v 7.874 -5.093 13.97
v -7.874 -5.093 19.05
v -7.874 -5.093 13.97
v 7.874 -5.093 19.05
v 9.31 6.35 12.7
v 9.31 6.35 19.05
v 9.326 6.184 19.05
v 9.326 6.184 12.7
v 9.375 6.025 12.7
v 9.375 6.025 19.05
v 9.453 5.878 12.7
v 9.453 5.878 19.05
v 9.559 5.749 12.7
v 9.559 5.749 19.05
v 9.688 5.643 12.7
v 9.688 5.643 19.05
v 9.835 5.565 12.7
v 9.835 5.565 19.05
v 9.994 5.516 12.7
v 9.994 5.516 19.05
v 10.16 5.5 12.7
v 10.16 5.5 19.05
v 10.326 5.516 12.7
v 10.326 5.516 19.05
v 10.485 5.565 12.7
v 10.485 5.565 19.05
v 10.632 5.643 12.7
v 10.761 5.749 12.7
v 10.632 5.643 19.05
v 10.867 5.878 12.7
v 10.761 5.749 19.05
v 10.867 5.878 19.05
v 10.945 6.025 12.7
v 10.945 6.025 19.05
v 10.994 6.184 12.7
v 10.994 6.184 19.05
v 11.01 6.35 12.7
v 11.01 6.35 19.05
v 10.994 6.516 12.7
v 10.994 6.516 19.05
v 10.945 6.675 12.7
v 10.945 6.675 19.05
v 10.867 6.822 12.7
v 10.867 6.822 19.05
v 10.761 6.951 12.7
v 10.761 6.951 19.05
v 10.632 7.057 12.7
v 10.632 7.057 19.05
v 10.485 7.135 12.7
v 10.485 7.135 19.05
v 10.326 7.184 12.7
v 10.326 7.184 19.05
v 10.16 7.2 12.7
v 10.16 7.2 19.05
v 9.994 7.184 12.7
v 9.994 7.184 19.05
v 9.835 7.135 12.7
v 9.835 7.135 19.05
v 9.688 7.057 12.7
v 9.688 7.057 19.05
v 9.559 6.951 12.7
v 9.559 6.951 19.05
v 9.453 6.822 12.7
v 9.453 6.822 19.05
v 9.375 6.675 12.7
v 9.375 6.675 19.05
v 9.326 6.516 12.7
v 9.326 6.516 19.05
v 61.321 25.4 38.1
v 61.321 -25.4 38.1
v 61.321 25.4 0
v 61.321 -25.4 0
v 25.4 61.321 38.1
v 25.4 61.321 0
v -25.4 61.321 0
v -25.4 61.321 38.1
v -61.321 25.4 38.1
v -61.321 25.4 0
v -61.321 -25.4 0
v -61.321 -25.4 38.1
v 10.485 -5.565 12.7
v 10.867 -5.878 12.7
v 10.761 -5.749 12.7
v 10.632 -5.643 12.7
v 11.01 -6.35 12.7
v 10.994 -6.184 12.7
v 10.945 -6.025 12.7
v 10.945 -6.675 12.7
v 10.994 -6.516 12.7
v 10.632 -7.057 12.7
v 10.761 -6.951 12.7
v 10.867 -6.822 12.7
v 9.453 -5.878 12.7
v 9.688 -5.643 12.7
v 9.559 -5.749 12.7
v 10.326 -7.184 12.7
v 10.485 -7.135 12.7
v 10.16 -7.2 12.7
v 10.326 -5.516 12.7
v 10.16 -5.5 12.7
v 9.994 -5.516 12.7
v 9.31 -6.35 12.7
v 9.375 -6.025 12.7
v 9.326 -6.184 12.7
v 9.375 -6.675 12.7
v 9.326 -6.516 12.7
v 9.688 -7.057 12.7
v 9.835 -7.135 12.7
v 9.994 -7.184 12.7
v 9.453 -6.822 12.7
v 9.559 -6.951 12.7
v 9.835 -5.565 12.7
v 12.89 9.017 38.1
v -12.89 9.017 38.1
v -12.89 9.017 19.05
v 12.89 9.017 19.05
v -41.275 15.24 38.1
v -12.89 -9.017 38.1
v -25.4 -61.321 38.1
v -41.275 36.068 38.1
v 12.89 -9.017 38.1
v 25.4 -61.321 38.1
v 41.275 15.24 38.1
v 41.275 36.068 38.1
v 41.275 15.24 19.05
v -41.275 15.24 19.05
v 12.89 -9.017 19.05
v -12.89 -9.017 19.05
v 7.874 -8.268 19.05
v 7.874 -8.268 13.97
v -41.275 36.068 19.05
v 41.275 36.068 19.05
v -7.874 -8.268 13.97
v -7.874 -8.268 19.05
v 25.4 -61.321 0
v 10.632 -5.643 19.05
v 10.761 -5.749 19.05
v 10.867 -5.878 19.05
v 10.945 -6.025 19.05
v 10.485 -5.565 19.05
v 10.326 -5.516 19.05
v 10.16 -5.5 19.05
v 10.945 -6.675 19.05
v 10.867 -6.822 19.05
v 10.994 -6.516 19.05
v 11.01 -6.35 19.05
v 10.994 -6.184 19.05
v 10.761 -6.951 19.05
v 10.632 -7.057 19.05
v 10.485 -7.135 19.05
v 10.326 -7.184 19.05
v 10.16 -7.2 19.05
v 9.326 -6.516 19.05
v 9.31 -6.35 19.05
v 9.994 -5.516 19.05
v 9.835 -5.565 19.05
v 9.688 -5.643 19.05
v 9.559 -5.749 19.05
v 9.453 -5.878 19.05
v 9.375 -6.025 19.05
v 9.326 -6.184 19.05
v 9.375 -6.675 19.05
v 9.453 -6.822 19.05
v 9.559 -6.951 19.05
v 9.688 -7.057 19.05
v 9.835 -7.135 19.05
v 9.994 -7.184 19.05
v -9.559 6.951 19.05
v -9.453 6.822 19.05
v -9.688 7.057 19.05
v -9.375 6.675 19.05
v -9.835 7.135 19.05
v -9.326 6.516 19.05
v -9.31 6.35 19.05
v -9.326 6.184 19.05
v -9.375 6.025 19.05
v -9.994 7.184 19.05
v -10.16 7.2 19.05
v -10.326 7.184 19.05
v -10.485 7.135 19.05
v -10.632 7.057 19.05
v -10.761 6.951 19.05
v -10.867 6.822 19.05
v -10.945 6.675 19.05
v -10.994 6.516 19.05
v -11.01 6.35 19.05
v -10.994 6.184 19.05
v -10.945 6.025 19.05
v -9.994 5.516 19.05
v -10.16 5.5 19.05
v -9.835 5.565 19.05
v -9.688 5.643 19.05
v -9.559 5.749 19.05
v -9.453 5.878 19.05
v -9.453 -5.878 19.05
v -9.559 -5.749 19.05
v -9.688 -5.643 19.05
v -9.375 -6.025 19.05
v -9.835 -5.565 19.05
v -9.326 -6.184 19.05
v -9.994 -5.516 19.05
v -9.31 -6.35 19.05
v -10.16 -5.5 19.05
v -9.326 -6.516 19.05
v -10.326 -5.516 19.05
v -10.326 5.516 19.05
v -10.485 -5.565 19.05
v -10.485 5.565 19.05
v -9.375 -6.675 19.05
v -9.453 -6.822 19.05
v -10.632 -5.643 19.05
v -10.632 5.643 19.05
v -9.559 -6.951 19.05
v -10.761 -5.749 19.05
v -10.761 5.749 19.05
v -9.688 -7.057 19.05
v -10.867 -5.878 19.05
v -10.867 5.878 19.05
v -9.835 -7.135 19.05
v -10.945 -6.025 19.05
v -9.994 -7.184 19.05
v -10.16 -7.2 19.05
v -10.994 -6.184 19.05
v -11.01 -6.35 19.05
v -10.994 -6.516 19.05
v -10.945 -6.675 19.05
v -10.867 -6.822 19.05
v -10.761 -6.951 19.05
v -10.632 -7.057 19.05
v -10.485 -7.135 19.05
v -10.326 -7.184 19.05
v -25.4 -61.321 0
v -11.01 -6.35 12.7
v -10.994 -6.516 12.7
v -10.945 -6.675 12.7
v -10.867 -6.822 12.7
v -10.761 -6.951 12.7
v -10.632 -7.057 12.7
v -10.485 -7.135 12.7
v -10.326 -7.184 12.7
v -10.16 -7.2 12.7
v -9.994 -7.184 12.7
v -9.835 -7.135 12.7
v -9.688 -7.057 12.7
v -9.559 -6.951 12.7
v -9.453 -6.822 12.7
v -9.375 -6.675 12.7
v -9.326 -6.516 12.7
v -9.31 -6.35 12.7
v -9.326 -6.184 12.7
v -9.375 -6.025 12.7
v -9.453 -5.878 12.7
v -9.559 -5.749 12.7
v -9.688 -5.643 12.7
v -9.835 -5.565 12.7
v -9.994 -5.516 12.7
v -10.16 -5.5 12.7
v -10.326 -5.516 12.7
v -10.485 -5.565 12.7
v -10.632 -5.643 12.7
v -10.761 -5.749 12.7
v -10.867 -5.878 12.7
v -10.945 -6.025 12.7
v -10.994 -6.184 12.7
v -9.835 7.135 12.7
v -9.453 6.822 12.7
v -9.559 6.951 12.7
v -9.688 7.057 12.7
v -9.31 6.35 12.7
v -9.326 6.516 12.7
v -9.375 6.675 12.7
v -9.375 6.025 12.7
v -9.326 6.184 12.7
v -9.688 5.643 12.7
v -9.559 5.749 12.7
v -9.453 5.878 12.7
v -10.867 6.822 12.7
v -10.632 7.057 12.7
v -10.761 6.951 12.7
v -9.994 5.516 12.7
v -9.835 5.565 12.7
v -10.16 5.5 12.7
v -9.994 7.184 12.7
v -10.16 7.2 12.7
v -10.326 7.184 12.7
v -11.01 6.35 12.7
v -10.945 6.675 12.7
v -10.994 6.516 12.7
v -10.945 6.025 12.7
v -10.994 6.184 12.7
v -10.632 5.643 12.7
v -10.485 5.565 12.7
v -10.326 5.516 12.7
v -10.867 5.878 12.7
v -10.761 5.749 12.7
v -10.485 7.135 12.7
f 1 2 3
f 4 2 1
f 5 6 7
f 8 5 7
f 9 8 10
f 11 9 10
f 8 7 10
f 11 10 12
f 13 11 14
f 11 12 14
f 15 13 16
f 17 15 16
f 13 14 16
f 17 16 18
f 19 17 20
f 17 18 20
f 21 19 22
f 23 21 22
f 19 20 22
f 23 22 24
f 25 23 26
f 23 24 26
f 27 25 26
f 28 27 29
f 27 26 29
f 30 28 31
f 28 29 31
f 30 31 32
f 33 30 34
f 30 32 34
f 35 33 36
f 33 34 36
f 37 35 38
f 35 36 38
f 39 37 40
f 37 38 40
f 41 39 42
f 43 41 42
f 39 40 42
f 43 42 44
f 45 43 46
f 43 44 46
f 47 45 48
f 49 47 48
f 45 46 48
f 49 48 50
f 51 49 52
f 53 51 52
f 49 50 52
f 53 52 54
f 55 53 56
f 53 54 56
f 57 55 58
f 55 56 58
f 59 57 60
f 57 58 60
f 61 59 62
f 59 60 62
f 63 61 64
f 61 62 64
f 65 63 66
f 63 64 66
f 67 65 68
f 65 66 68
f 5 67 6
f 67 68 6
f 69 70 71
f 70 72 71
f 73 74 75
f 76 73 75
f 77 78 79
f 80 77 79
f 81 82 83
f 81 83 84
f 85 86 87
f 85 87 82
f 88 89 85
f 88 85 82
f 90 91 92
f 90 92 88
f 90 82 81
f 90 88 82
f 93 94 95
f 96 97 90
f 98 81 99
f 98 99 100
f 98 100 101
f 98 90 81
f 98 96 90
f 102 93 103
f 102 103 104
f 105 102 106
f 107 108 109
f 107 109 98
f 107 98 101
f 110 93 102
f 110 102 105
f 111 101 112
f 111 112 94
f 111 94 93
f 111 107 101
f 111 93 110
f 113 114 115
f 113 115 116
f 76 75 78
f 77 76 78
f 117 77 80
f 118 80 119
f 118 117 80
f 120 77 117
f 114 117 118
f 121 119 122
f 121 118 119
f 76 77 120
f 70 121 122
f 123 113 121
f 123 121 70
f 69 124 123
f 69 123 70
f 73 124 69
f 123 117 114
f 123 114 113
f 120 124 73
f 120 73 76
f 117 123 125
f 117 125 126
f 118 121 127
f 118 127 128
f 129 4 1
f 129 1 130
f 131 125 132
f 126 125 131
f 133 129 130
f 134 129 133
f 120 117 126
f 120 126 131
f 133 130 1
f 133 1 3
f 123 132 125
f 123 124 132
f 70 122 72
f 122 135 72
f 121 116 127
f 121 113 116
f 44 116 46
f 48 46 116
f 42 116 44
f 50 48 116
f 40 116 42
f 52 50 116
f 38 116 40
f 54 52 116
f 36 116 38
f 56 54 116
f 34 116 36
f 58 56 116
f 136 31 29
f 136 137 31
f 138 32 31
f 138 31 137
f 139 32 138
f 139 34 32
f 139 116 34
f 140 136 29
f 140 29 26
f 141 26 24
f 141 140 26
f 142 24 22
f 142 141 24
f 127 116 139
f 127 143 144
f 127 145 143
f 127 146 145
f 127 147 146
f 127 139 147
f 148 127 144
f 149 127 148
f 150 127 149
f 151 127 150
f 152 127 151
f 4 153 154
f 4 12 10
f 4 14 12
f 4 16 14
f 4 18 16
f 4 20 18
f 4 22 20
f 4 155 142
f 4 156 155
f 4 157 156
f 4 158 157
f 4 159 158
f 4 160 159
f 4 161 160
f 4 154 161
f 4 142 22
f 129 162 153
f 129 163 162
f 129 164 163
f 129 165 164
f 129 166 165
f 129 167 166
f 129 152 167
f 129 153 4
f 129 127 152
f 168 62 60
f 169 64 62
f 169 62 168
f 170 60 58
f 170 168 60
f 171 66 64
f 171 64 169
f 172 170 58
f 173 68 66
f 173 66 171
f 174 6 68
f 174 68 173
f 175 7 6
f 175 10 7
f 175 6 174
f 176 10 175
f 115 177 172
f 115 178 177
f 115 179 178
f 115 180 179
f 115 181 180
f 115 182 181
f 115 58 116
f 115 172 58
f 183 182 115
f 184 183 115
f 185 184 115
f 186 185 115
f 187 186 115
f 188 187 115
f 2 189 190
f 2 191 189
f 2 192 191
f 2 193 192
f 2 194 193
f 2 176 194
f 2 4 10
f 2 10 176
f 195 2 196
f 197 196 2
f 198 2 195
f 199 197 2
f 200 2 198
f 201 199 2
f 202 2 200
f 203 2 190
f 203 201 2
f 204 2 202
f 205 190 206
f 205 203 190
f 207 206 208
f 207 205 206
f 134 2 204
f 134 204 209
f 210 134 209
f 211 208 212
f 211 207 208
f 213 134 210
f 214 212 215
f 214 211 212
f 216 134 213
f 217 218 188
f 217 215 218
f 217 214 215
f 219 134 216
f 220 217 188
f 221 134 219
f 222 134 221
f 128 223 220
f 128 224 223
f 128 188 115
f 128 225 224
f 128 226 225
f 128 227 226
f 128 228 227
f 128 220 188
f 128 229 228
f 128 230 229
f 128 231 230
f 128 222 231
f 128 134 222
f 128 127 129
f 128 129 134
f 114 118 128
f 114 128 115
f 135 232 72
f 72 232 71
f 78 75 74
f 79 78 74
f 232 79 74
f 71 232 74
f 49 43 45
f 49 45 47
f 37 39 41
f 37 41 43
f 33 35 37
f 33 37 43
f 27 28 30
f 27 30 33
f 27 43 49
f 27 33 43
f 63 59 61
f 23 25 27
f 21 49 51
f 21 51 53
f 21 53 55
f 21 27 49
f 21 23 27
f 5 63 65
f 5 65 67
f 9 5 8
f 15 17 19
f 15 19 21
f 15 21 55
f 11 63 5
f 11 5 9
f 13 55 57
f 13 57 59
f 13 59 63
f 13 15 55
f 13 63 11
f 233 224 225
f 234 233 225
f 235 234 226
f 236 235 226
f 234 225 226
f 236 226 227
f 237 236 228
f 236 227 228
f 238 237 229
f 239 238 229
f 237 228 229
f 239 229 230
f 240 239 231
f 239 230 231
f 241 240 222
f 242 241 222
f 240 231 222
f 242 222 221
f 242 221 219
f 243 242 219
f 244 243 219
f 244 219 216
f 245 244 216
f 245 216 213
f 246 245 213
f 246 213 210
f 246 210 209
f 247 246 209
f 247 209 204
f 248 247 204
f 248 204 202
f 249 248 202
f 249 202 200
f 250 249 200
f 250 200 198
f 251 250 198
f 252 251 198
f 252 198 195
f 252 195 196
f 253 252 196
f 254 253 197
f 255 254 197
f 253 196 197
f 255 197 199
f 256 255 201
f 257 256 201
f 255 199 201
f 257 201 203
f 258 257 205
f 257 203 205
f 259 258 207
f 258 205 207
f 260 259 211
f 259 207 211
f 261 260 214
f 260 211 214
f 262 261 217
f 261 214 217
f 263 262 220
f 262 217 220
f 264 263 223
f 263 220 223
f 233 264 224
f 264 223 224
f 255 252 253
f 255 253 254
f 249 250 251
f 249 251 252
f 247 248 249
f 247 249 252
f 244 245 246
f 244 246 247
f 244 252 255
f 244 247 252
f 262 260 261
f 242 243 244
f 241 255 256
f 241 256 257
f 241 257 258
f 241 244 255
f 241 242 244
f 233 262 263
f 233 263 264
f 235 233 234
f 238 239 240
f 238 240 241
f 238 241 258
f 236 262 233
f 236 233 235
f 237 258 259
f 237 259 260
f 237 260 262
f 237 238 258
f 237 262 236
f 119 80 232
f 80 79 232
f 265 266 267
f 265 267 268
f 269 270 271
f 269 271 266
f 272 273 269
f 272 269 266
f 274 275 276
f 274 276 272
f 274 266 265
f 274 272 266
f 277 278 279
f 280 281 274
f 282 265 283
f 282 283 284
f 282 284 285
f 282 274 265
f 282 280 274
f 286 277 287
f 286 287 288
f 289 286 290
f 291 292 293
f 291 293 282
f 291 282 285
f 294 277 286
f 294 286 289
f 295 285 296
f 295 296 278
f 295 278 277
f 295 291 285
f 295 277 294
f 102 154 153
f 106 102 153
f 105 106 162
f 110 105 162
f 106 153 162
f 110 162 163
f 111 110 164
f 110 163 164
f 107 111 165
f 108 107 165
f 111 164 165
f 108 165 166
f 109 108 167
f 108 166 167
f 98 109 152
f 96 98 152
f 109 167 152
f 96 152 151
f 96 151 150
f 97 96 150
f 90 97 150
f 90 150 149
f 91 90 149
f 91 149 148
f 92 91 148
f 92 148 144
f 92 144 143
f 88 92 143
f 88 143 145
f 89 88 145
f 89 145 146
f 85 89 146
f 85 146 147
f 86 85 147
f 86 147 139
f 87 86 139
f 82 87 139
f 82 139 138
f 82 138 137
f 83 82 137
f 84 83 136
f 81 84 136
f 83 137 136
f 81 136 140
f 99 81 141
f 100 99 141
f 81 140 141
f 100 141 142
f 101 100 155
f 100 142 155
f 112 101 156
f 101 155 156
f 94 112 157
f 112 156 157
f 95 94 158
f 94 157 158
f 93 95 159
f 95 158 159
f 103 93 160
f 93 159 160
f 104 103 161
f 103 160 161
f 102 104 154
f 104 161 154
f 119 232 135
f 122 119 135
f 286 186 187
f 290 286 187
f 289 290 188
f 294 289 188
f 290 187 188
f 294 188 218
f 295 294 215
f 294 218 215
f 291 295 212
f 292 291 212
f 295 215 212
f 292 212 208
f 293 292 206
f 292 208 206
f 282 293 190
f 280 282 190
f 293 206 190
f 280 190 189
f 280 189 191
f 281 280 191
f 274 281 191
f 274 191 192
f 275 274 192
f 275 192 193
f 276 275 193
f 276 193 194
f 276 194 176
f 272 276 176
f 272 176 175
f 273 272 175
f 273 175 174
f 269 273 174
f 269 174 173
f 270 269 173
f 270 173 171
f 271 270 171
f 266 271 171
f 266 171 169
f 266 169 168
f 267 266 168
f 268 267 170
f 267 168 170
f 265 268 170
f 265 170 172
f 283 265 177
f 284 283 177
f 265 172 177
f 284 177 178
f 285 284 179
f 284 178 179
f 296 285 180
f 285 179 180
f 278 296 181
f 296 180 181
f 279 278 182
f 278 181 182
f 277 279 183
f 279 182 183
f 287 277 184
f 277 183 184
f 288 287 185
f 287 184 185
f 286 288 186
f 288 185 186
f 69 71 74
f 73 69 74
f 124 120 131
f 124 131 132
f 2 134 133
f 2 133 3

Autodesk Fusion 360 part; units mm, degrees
sketch "Sketch1" plane through (0, 0, 0) normal (0, 0, 1) x (1, 0, 0)
  line L0 (61.321, 25.4) -> (25.4, 61.321)
  line L1 (25.4, 61.321) -> (-25.4, 61.321)
  line L2 (-25.4, 61.321) -> (-61.321, 25.4)
  line L3 (-61.321, 25.4) -> (-61.321, -25.4)
  line L4 (-61.321, -25.4) -> (-25.4, -61.321)
  line L5 (-25.4, -61.321) -> (25.4, -61.321)
  line L6 (25.4, -61.321) -> (61.321, -25.4)
  line L7 (61.321, -25.4) -> (61.321, 25.4)
  dimension "d1" = 50.8
extrude "Extrude1" add sketch "Sketch1" along normal blind 38.1
sketch "Sketch6" plane through (0, 0, 38.1) normal (0, 0, 1) x (-1, 0, 0)
  line L0 (-61.321, 25.4) -> (-61.321, -25.4)
  line L1 (-61.321, -25.4) -> (-25.4, -61.321)
  line L2 (-25.4, -61.321) -> (25.4, -61.321)
  line L3 (25.4, -61.321) -> (61.321, -25.4)
  line L4 (61.321, -25.4) -> (61.321, 25.4)
  line L5 (61.321, 25.4) -> (25.4, 61.321)
  line L6 (25.4, 61.321) -> (-25.4, 61.321)
  line L7 (-25.4, 61.321) -> (-61.321, 25.4)
  line L8 (-12.8905, 9.017) -> (12.8905, 9.017)
  line L9 (12.8905, 9.017) -> (12.8905, -9.017)
  line L10 (12.8905, -9.017) -> (-12.8905, -9.017)
  line L11 (-12.8905, -9.017) -> (-12.8905, 9.017)
  line L12 (-12.8905, 9.017) -> (12.8905, -9.017) construction
  line L13 (12.8905, 9.017) -> (-12.8905, -9.017) construction
  dimension "d28" = 25.781
  dimension "d29" = 18.034
extrude "Extrude12" cut sketch "Sketch6" against normal blind 19.05 contours L8 L9 L10 L11
sketch "Sketch7" plane through (0, 0, 19.05) normal (0, 0, 1) x (-1, 0, 0)
  line L0 (-12.8905, -9.017) -> (12.8905, -9.017)
  line L1 (12.8905, -9.017) -> (12.8905, 9.017)
  line L2 (12.8905, 9.017) -> (-12.8905, 9.017)
  line L3 (-12.8905, 9.017) -> (-12.8905, -9.017)
  circle A0 centre (10.16, -6.35) radius 0.85
  dimension "d40" = 1.7
  dimension "d41" = 10.16
  dimension "d42" = 6.35
extrude "Extrude13" cut sketch "Sketch7" against normal blind 6.35 contours A0
sketch "Sketch8" plane through (0, 0, 19.05) normal (0, 0, 1) x (-1, 0, 0)
  circle A0 centre (10.16, -6.35) radius 0.85
  line L0 (-12.8905, -9.017) -> (12.8905, -9.017)
  line L1 (12.8905, -9.017) -> (12.8905, 9.017)
  line L2 (12.8905, 9.017) -> (-12.8905, 9.017)
  line L3 (-12.8905, 9.017) -> (-12.8905, -9.017)
  line L4 (0, -11.43) -> (0, 10.8522)
  line L5 (13.97, 0) -> (-13.97, 0)
  circle A1 centre (-10.16, -6.35) radius 0.85
  circle A2 centre (10.16, 6.35) radius 0.85
  circle A3 centre (-10.16, 6.35) radius 0.85
extrude "Extrude14" cut sketch "Sketch8" against normal blind 6.35 contours A1 | A2 | A3
sketch "Sketch9" plane through (0, 0, 19.05) normal (0, 0, 1) x (-1, 0, 0)
  circle A0 centre (-10.16, -6.35) radius 0.85
  circle A1 centre (-10.16, 6.35) radius 0.85
  circle A2 centre (10.16, 6.35) radius 0.85
  circle A3 centre (10.16, -6.35) radius 0.85
  line L0 (-12.8905, -9.017) -> (12.8905, -9.017)
  line L1 (12.8905, -9.017) -> (12.8905, 9.017)
  line L2 (12.8905, 9.017) -> (-12.8905, 9.017)
  line L3 (-12.8905, 9.017) -> (-12.8905, -9.017)
  line L4 (7.874, 5.0932) -> (-7.874, 5.0932)
  line L5 (-7.874, 5.0932) -> (-7.874, 8.2682)
  line L6 (-7.874, 8.2682) -> (7.874, 8.2682)
  line L7 (7.874, 8.2682) -> (7.874, 5.0932)
  dimension "d45" = 15.748
  dimension "d46" = 3.175
  dimension "d47" = 7.874
extrude "Extrude15" cut sketch "Sketch9" against normal blind 5.08 contours L4 L5 L6 L7
sketch "Sketch10" plane through (0, 0, 38.1) normal (0, 0, 1) x (-1, 0, 0)
  line L0 (12.8905, 9.017) -> (12.8905, -9.017)
  line L1 (12.8905, -9.017) -> (-12.8905, -9.017)
  line L2 (-12.8905, -9.017) -> (-12.8905, 9.017)
  line L3 (-12.8905, 9.017) -> (12.8905, 9.017)
  line L4 (-61.321, 25.4) -> (-61.321, -25.4)
  line L5 (-61.321, -25.4) -> (-25.4, -61.321)
  line L6 (-25.4, -61.321) -> (25.4, -61.321)
  line L7 (25.4, -61.321) -> (61.321, -25.4)
  line L8 (61.321, -25.4) -> (61.321, 25.4)
  line L9 (61.321, 25.4) -> (25.4, 61.321)
  line L10 (25.4, 61.321) -> (-25.4, 61.321)
  line L11 (-25.4, 61.321) -> (-61.321, 25.4)
  line L12 (41.275, -36.068) -> (-41.275, -36.068)
  line L13 (-41.275, -36.068) -> (-41.275, -15.24)
  line L14 (-41.275, -15.24) -> (41.275, -15.24)
  line L15 (41.275, -15.24) -> (41.275, -36.068)
  line L16 (41.275, -36.068) -> (-41.275, -15.24) construction
  line L17 (-41.275, -36.068) -> (41.275, -15.24) construction
  point P0 (0, -25.654)
  dimension "d50" = 82.55
  dimension "d51" = 20.828
  dimension "d52" = 15.24
extrude "Extrude16" cut sketch "Sketch10" against normal blind 19.05 contours L12 L13 L14 L15
equation "d47 = ( 0.62 / 2 ) * 1 in"
